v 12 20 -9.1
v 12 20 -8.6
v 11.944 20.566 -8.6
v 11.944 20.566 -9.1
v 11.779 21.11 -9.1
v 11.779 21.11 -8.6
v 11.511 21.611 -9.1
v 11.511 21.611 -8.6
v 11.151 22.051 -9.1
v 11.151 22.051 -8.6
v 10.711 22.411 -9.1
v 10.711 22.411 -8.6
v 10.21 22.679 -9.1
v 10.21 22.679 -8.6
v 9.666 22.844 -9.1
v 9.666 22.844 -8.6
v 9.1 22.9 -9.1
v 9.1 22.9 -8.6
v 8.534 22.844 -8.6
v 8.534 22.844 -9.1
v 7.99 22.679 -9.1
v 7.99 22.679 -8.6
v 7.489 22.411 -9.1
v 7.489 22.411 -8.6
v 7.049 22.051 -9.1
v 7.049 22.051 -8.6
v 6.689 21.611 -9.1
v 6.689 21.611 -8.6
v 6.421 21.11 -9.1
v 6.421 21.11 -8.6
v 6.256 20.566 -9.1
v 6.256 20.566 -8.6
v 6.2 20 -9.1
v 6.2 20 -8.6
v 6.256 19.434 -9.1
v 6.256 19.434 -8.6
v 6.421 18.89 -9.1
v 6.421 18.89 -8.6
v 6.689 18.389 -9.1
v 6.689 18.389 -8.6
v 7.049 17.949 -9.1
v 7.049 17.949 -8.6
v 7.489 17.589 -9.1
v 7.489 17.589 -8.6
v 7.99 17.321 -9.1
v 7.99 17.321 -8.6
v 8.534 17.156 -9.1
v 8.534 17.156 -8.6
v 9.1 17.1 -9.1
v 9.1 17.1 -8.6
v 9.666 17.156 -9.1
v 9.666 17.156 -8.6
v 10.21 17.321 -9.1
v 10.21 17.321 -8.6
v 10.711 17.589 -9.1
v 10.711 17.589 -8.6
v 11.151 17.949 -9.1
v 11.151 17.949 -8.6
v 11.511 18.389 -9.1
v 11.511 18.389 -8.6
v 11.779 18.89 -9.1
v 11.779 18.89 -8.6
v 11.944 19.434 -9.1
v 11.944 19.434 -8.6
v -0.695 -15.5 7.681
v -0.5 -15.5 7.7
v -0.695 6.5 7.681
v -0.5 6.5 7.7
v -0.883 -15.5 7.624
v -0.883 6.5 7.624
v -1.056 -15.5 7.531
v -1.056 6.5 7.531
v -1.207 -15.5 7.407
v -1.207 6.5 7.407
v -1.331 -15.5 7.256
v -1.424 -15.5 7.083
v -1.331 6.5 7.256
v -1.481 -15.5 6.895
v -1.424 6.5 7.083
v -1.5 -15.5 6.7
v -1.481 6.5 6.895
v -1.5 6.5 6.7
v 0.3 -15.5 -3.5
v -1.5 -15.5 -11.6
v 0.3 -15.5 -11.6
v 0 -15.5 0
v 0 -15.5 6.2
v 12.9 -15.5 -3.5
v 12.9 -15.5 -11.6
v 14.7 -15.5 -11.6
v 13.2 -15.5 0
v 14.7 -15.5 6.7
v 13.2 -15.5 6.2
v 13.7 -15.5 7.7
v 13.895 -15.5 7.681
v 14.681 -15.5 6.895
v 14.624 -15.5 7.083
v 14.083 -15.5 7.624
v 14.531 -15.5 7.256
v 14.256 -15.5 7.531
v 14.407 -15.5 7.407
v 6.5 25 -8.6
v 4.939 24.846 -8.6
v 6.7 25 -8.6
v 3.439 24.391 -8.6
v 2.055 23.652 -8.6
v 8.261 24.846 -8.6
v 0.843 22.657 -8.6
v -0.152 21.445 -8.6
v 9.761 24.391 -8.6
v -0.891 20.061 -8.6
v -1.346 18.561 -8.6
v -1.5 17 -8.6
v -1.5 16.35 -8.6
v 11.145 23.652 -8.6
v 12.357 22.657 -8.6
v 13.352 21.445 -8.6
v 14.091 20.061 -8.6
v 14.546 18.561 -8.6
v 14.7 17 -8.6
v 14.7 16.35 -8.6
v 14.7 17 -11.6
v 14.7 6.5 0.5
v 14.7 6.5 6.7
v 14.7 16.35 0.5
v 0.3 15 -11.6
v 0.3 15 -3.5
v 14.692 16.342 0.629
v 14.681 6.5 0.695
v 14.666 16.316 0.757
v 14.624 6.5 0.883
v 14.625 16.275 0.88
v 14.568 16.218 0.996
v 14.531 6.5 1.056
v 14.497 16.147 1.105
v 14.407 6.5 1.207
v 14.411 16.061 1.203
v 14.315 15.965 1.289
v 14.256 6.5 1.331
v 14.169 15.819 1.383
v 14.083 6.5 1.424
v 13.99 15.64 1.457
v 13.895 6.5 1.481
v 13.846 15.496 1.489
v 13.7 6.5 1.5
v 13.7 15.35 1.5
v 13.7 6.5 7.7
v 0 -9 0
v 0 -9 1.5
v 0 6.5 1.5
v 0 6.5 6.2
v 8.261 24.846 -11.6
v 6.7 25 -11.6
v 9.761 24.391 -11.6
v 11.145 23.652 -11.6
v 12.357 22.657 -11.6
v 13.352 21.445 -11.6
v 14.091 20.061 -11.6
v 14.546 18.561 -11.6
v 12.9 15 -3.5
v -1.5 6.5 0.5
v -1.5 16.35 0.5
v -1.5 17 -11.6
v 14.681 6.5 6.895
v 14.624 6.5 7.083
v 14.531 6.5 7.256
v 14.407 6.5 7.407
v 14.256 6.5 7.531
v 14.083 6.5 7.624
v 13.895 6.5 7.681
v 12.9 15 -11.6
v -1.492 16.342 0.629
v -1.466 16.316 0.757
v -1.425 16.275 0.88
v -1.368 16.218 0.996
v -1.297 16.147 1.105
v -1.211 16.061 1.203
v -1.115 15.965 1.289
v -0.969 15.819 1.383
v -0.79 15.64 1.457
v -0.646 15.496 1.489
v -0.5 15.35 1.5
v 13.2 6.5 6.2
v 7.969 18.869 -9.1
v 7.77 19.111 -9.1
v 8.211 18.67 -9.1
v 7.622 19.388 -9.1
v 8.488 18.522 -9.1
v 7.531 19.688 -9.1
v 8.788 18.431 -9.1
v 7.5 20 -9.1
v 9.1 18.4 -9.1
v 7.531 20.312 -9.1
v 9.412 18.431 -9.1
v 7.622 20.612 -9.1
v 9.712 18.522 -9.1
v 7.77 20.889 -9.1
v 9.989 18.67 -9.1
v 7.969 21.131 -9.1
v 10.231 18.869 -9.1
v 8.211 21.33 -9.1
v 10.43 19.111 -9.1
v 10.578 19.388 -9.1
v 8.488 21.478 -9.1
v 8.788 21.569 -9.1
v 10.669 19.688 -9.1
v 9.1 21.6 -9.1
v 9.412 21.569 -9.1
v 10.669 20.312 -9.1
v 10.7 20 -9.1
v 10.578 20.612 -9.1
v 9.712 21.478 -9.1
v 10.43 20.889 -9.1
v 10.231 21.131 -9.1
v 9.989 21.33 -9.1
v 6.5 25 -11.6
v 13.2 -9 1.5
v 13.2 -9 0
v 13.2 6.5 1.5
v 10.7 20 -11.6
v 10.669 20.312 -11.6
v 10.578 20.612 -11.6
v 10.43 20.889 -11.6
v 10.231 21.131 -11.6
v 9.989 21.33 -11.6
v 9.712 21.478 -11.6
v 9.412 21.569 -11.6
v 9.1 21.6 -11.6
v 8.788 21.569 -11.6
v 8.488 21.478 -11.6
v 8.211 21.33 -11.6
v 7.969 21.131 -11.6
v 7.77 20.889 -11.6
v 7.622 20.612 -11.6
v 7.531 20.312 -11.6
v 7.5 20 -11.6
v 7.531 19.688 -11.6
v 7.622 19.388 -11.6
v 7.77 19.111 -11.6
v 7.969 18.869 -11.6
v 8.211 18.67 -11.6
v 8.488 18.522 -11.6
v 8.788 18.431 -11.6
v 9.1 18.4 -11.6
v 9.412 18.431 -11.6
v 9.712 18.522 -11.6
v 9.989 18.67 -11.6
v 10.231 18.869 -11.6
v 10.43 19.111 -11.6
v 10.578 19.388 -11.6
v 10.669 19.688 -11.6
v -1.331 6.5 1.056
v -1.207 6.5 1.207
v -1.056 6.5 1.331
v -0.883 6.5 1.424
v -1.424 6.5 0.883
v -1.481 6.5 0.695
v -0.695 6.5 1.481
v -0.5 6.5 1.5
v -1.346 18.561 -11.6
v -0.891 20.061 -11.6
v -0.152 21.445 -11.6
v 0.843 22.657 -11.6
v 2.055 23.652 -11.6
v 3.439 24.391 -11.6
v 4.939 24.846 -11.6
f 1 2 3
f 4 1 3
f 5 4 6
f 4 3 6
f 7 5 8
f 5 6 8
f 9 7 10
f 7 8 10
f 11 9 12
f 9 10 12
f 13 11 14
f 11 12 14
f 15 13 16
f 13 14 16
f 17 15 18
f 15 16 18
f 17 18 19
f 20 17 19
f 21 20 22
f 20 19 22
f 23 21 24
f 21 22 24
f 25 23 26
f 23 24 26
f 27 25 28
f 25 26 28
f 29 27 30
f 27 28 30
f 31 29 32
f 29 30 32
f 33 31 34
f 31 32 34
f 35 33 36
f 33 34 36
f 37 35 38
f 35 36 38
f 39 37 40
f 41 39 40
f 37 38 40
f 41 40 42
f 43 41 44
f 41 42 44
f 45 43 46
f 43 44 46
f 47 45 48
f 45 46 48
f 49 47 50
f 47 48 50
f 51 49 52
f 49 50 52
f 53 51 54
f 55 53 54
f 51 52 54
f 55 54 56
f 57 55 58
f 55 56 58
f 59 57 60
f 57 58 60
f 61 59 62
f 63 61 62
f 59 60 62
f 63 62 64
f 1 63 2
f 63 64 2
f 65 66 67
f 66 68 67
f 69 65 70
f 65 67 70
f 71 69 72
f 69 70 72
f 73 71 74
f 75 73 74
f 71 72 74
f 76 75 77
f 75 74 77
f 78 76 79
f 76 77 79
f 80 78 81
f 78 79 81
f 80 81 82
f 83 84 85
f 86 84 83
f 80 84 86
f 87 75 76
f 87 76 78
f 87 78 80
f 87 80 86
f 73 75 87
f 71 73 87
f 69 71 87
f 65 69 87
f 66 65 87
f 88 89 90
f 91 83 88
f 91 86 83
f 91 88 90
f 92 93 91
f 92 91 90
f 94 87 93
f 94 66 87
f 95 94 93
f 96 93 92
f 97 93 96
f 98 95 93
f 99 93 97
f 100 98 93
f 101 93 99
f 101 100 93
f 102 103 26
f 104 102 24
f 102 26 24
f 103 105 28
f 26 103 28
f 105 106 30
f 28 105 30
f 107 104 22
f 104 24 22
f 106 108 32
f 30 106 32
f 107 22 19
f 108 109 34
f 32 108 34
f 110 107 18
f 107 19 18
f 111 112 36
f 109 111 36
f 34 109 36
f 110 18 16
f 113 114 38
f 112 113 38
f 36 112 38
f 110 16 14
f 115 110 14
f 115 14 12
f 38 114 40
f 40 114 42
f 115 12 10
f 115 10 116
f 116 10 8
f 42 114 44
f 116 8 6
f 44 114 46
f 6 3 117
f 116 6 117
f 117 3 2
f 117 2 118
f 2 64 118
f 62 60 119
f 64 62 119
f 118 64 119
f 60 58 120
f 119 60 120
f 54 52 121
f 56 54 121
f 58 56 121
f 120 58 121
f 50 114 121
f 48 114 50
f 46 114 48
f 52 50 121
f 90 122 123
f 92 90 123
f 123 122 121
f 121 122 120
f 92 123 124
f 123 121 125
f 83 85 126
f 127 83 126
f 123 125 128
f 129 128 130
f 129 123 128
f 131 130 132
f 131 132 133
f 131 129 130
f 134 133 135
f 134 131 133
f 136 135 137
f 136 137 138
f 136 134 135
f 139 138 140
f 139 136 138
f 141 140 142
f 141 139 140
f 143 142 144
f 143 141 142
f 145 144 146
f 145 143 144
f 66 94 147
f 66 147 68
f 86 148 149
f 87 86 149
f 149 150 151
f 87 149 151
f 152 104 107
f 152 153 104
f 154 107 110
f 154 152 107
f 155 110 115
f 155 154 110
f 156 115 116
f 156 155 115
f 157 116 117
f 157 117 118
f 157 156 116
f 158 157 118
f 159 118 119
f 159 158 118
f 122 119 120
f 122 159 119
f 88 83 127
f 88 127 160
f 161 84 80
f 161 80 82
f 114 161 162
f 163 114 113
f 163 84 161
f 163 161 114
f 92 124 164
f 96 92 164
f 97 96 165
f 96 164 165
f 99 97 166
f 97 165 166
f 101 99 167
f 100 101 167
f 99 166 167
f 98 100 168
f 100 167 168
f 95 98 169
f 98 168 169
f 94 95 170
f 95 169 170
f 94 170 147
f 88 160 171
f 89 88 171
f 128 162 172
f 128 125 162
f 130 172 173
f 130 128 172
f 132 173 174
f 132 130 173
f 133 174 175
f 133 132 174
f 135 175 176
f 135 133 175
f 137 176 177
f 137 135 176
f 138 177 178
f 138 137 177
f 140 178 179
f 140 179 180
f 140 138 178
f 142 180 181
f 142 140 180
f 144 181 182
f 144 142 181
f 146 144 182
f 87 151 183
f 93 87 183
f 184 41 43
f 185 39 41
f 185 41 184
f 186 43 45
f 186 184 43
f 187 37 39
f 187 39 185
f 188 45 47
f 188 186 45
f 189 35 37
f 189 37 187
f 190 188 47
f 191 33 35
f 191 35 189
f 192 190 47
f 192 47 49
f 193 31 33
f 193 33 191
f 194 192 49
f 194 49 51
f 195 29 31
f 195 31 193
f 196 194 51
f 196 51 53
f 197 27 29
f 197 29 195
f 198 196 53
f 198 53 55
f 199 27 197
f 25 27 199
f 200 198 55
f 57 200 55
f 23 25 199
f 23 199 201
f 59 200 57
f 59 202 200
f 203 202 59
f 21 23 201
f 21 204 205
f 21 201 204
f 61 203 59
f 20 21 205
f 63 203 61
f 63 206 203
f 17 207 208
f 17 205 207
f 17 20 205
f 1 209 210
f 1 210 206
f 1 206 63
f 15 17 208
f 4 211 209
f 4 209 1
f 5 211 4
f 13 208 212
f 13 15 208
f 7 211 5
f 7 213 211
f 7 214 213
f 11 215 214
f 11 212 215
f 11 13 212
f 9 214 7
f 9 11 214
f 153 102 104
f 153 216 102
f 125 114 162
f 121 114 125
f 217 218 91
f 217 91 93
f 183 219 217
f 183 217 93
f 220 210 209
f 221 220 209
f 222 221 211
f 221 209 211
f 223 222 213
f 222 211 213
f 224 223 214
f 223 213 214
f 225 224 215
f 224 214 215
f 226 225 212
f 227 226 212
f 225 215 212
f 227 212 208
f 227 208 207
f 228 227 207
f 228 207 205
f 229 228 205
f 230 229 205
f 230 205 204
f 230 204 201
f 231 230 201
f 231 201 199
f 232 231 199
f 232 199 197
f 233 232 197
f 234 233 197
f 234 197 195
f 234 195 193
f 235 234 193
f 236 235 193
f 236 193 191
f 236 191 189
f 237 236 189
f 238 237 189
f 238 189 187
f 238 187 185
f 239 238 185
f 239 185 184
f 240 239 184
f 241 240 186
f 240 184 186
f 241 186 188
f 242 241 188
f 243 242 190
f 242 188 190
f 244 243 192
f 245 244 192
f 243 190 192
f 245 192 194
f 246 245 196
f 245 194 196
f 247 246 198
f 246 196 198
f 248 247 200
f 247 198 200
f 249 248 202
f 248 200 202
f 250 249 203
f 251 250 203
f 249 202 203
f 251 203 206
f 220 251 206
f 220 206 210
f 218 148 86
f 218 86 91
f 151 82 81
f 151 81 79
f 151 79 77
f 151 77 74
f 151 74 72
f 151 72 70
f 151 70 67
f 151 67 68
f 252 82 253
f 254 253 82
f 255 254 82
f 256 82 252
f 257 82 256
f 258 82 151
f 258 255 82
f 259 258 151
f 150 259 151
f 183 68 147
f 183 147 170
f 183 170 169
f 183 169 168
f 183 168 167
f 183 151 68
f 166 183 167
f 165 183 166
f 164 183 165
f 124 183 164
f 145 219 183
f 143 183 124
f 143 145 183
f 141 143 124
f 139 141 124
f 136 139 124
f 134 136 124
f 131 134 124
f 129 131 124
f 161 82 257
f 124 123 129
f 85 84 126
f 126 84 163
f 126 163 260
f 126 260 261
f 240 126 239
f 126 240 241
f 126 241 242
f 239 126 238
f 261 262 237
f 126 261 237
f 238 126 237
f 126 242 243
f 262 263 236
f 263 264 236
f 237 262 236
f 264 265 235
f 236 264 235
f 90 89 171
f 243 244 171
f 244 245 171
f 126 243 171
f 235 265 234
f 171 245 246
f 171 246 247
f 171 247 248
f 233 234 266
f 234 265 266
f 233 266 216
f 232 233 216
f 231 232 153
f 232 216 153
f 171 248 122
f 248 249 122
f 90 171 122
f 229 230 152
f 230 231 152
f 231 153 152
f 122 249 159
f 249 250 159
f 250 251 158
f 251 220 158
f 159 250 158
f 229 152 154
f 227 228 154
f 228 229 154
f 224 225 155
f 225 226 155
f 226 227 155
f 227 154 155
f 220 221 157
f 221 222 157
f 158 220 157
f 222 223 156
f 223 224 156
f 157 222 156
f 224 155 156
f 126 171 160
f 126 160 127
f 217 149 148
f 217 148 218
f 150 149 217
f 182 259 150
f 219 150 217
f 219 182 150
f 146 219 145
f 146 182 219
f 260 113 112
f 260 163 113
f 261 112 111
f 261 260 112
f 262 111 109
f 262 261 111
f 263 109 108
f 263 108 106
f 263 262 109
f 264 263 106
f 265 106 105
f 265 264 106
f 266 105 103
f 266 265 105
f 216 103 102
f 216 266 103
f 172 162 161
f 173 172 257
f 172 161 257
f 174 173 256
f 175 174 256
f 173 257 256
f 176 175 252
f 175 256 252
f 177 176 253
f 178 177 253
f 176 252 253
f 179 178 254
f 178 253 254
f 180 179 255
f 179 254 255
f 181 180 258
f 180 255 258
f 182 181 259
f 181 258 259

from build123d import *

# Parameters (mm, degrees)
CROQUIS2_W               = 16.2
CROQUIS2_H               = 9.2
CROQUIS2_W_2             = 13.2
CROQUIS2_H_2             = 6.2
SALIENTE_EXTRUIR1_DEPTH  = 6.5
CROQUIS3_W               = 16.2
CROQUIS3_H               = 12
SALIENTE_EXTRUIR2_DEPTH  = 2
SALIENTE_EXTRUIR3_DEPTH  = 8.1
CROQUIS5_W               = 16.2
CROQUIS5_H               = 3
SALIENTE_EXTRUIR4_DEPTH  = 13
CROQUIS6_R               = 1.6
CORTAR_EXTRUIR1_DEPTH    = 3
CROQUIS7_W               = 16.2
CROQUIS7_H               = 2
SALIENTE_EXTRUIR5_DEPTH  = 3
CROQUIS8_R               = 2.9
CORTAR_EXTRUIR2_DEPTH    = 0.5
REDONDEO1_R              = 1
REDONDEO6_R              = 8
CROQUIS9_W               = 13.2
CROQUIS9_H               = 6.2
SALIENTE_EXTRUIR6_DEPTH  = 3.5
CROQUIS10_W              = 13.2
CROQUIS10_H              = 1.5
SALIENTE_EXTRUIR7_DEPTH  = 3.5
CROQUIS11_W              = 13.2
CROQUIS11_H              = 6.2
SALIENTE_EXTRUIR8_DEPTH  = 12
CROQUIS12_W              = 13.2
CROQUIS12_H              = 1.5
SALIENTE_EXTRUIR9_DEPTH  = 12
CROQUIS13_W              = 16.2
CROQUIS13_H              = 7.85
SALIENTE_EXTRUIR10_DEPTH = 10.1
CROQUIS14_W              = 12.6
CROQUIS14_H              = 6.5
CORTAR_EXTRUIR3_DEPTH    = 8.1
REDONDEO7_R              = 1


with BuildPart() as part:
    # Croquis2 → Saliente-Extruir1 (new body)
    with BuildSketch(Plane(origin=(0, 0, 0), x_dir=(1, 0, 0), z_dir=(0, 1, 0))):
        with Locations((6.6, -3.1)):
            Rectangle(CROQUIS2_W, CROQUIS2_H)
        with Locations((6.6, -3.1)):
            Rectangle(CROQUIS2_W_2, CROQUIS2_H_2, mode=Mode.SUBTRACT)
    extrude(amount=SALIENTE_EXTRUIR1_DEPTH)

    # Croquis3 → Saliente-Extruir2 (add)
    with BuildSketch(Plane(origin=(0, 0, -1.5), x_dir=(-1, 0, 0), z_dir=(0, 0, -1))):
        with Locations((-6.6, 6)):
            Rectangle(CROQUIS3_W, CROQUIS3_H)
    extrude(amount=SALIENTE_EXTRUIR2_DEPTH)

    # Croquis4 → Saliente-Extruir3 (add)
    with BuildSketch(Plane(origin=(0, 0, -3.5), x_dir=(-1, 0, 0), z_dir=(0, 0, -1))):
        Polygon((1.5, 0), (1.5, 12), (-14.7, 12), (-14.7, 0), (-12.9, 0), (-12.9, 11), (-0.3, 11), (-0.3, 0), align=None)
    extrude(amount=SALIENTE_EXTRUIR3_DEPTH)

    # Croquis5 → Saliente-Extruir4 (add)
    with BuildSketch(Plane(origin=(0, 12, 0), x_dir=(1, 0, 0), z_dir=(0, 1, 0))):
        with Locations((6.6, 10.1)):
            Rectangle(CROQUIS5_W, CROQUIS5_H)
    extrude(amount=SALIENTE_EXTRUIR4_DEPTH)

    # Croquis6 → Cortar-Extruir1 (cut)
    with BuildSketch(Plane.XY.offset(-8.6)):
        with Locations((9.1, 20)):
            Circle(CROQUIS6_R)
    extrude(amount=-CORTAR_EXTRUIR1_DEPTH, mode=Mode.SUBTRACT)

    # Croquis7 → Saliente-Extruir5 (add)
    with BuildSketch(Plane.XY.offset(-1.5)):
        with Locations((6.6, 7.5)):
            Rectangle(CROQUIS7_W, CROQUIS7_H)
    extrude(amount=SALIENTE_EXTRUIR5_DEPTH)

    # Croquis8 → Cortar-Extruir2 (cut)
    with BuildSketch(Plane.XY.offset(-8.6)):
        with Locations((9.1, 20)):
            Circle(CROQUIS8_R)
    extrude(amount=-CORTAR_EXTRUIR2_DEPTH, mode=Mode.SUBTRACT)

    # Redondeo1
    redondeo1_edges = [part.edges().sort_by_distance(p)[0] for p in [
        (14.7, 3.25, 7.7),
        (-1.5, 3.25, 7.7),
    ]]
    fillet(redondeo1_edges, radius=REDONDEO1_R)

    # Redondeo6
    redondeo6_edges = [part.edges().sort_by_distance(p)[0] for p in [
        (14.7, 25, -10.1),
        (-1.5, 25, -10.1),
    ]]
    fillet(redondeo6_edges, radius=REDONDEO6_R)

    # Croquis9 → Saliente-Extruir6 (add)
    with BuildSketch(Plane.XZ):
        with BuildLine():
            Line((13.7, 7.7), (-0.5, 7.7))
            ThreePointArc((-0.5, 7.7), (-1.207106781, 7.407106781), (-1.5, 6.7))
            Line((-1.5, 6.7), (-1.5, -11.6))
            Line((-1.5, -11.6), (0.3, -11.6))
            Line((0.3, -11.6), (0.3, -3.5))
            Line((0.3, -3.5), (12.9, -3.5))
            Line((12.9, -3.5), (12.9, -11.6))
            Line((12.9, -11.6), (14.7, -11.6))
            Line((14.7, -11.6), (14.7, 6.7))
            ThreePointArc((14.7, 6.7), (14.407106781, 7.407106781), (13.7, 7.7))
        make_face()
        with Locations((6.6, 3.1)):
            Rectangle(CROQUIS9_W, CROQUIS9_H, mode=Mode.SUBTRACT)
    extrude(amount=SALIENTE_EXTRUIR6_DEPTH)

    # Croquis10 → Saliente-Extruir7 (add)
    with BuildSketch(Plane.XZ.offset(-6.5)):
        with Locations((6.6, 0.75)):
            Rectangle(CROQUIS10_W, CROQUIS10_H)
    extrude(amount=SALIENTE_EXTRUIR7_DEPTH)

    # Croquis11 → Saliente-Extruir8 (add)
    with BuildSketch(Plane.XZ.offset(3.5)):
        with BuildLine():
            Line((13.7, 7.7), (-0.5, 7.7))
            ThreePointArc((-0.5, 7.7), (-1.207106781, 7.407106781), (-1.5, 6.7))
            Line((-1.5, 6.7), (-1.5, -11.6))
            Line((-1.5, -11.6), (0.3, -11.6))
            Line((0.3, -11.6), (0.3, -3.5))
            Line((0.3, -3.5), (12.9, -3.5))
            Line((12.9, -3.5), (12.9, -11.6))
            Line((12.9, -11.6), (14.7, -11.6))
            Line((14.7, -11.6), (14.7, 6.7))
            ThreePointArc((14.7, 6.7), (14.407106781, 7.407106781), (13.7, 7.7))
        make_face()
        with Locations((6.6, 3.1)):
            Rectangle(CROQUIS11_W, CROQUIS11_H, mode=Mode.SUBTRACT)
    extrude(amount=SALIENTE_EXTRUIR8_DEPTH)

    # Croquis12 → Saliente-Extruir9 (add)
    with BuildSketch(Plane.XZ.offset(-3)):
        with Locations((6.6, 0.75)):
            Rectangle(CROQUIS12_W, CROQUIS12_H)
    extrude(amount=SALIENTE_EXTRUIR9_DEPTH)

    # Croquis13 → Saliente-Extruir10 (add)
    with BuildSketch(Plane.XY.offset(-8.6)):
        with Locations((6.6, 12.425)):
            Rectangle(CROQUIS13_W, CROQUIS13_H)
    extrude(amount=SALIENTE_EXTRUIR10_DEPTH)

    # Croquis14 → Cortar-Extruir3 (cut)
    with BuildSketch(Plane(origin=(0, 0, -11.6), x_dir=(-1, 0, 0), z_dir=(0, 0, -1))):
        with Locations((-6.6, 11.75)):
            Rectangle(CROQUIS14_W, CROQUIS14_H)
    extrude(amount=-CORTAR_EXTRUIR3_DEPTH, mode=Mode.SUBTRACT)

    # Redondeo7
    redondeo7_edges = [part.edges().sort_by_distance(p)[0] for p in [
        (6.6, 16.35, 1.5),
        (14.7, 11.425, 1.5),
        (-1.5, 11.425, 1.5),
    ]]
    fillet(redondeo7_edges, radius=REDONDEO7_R)


solid = part.part
